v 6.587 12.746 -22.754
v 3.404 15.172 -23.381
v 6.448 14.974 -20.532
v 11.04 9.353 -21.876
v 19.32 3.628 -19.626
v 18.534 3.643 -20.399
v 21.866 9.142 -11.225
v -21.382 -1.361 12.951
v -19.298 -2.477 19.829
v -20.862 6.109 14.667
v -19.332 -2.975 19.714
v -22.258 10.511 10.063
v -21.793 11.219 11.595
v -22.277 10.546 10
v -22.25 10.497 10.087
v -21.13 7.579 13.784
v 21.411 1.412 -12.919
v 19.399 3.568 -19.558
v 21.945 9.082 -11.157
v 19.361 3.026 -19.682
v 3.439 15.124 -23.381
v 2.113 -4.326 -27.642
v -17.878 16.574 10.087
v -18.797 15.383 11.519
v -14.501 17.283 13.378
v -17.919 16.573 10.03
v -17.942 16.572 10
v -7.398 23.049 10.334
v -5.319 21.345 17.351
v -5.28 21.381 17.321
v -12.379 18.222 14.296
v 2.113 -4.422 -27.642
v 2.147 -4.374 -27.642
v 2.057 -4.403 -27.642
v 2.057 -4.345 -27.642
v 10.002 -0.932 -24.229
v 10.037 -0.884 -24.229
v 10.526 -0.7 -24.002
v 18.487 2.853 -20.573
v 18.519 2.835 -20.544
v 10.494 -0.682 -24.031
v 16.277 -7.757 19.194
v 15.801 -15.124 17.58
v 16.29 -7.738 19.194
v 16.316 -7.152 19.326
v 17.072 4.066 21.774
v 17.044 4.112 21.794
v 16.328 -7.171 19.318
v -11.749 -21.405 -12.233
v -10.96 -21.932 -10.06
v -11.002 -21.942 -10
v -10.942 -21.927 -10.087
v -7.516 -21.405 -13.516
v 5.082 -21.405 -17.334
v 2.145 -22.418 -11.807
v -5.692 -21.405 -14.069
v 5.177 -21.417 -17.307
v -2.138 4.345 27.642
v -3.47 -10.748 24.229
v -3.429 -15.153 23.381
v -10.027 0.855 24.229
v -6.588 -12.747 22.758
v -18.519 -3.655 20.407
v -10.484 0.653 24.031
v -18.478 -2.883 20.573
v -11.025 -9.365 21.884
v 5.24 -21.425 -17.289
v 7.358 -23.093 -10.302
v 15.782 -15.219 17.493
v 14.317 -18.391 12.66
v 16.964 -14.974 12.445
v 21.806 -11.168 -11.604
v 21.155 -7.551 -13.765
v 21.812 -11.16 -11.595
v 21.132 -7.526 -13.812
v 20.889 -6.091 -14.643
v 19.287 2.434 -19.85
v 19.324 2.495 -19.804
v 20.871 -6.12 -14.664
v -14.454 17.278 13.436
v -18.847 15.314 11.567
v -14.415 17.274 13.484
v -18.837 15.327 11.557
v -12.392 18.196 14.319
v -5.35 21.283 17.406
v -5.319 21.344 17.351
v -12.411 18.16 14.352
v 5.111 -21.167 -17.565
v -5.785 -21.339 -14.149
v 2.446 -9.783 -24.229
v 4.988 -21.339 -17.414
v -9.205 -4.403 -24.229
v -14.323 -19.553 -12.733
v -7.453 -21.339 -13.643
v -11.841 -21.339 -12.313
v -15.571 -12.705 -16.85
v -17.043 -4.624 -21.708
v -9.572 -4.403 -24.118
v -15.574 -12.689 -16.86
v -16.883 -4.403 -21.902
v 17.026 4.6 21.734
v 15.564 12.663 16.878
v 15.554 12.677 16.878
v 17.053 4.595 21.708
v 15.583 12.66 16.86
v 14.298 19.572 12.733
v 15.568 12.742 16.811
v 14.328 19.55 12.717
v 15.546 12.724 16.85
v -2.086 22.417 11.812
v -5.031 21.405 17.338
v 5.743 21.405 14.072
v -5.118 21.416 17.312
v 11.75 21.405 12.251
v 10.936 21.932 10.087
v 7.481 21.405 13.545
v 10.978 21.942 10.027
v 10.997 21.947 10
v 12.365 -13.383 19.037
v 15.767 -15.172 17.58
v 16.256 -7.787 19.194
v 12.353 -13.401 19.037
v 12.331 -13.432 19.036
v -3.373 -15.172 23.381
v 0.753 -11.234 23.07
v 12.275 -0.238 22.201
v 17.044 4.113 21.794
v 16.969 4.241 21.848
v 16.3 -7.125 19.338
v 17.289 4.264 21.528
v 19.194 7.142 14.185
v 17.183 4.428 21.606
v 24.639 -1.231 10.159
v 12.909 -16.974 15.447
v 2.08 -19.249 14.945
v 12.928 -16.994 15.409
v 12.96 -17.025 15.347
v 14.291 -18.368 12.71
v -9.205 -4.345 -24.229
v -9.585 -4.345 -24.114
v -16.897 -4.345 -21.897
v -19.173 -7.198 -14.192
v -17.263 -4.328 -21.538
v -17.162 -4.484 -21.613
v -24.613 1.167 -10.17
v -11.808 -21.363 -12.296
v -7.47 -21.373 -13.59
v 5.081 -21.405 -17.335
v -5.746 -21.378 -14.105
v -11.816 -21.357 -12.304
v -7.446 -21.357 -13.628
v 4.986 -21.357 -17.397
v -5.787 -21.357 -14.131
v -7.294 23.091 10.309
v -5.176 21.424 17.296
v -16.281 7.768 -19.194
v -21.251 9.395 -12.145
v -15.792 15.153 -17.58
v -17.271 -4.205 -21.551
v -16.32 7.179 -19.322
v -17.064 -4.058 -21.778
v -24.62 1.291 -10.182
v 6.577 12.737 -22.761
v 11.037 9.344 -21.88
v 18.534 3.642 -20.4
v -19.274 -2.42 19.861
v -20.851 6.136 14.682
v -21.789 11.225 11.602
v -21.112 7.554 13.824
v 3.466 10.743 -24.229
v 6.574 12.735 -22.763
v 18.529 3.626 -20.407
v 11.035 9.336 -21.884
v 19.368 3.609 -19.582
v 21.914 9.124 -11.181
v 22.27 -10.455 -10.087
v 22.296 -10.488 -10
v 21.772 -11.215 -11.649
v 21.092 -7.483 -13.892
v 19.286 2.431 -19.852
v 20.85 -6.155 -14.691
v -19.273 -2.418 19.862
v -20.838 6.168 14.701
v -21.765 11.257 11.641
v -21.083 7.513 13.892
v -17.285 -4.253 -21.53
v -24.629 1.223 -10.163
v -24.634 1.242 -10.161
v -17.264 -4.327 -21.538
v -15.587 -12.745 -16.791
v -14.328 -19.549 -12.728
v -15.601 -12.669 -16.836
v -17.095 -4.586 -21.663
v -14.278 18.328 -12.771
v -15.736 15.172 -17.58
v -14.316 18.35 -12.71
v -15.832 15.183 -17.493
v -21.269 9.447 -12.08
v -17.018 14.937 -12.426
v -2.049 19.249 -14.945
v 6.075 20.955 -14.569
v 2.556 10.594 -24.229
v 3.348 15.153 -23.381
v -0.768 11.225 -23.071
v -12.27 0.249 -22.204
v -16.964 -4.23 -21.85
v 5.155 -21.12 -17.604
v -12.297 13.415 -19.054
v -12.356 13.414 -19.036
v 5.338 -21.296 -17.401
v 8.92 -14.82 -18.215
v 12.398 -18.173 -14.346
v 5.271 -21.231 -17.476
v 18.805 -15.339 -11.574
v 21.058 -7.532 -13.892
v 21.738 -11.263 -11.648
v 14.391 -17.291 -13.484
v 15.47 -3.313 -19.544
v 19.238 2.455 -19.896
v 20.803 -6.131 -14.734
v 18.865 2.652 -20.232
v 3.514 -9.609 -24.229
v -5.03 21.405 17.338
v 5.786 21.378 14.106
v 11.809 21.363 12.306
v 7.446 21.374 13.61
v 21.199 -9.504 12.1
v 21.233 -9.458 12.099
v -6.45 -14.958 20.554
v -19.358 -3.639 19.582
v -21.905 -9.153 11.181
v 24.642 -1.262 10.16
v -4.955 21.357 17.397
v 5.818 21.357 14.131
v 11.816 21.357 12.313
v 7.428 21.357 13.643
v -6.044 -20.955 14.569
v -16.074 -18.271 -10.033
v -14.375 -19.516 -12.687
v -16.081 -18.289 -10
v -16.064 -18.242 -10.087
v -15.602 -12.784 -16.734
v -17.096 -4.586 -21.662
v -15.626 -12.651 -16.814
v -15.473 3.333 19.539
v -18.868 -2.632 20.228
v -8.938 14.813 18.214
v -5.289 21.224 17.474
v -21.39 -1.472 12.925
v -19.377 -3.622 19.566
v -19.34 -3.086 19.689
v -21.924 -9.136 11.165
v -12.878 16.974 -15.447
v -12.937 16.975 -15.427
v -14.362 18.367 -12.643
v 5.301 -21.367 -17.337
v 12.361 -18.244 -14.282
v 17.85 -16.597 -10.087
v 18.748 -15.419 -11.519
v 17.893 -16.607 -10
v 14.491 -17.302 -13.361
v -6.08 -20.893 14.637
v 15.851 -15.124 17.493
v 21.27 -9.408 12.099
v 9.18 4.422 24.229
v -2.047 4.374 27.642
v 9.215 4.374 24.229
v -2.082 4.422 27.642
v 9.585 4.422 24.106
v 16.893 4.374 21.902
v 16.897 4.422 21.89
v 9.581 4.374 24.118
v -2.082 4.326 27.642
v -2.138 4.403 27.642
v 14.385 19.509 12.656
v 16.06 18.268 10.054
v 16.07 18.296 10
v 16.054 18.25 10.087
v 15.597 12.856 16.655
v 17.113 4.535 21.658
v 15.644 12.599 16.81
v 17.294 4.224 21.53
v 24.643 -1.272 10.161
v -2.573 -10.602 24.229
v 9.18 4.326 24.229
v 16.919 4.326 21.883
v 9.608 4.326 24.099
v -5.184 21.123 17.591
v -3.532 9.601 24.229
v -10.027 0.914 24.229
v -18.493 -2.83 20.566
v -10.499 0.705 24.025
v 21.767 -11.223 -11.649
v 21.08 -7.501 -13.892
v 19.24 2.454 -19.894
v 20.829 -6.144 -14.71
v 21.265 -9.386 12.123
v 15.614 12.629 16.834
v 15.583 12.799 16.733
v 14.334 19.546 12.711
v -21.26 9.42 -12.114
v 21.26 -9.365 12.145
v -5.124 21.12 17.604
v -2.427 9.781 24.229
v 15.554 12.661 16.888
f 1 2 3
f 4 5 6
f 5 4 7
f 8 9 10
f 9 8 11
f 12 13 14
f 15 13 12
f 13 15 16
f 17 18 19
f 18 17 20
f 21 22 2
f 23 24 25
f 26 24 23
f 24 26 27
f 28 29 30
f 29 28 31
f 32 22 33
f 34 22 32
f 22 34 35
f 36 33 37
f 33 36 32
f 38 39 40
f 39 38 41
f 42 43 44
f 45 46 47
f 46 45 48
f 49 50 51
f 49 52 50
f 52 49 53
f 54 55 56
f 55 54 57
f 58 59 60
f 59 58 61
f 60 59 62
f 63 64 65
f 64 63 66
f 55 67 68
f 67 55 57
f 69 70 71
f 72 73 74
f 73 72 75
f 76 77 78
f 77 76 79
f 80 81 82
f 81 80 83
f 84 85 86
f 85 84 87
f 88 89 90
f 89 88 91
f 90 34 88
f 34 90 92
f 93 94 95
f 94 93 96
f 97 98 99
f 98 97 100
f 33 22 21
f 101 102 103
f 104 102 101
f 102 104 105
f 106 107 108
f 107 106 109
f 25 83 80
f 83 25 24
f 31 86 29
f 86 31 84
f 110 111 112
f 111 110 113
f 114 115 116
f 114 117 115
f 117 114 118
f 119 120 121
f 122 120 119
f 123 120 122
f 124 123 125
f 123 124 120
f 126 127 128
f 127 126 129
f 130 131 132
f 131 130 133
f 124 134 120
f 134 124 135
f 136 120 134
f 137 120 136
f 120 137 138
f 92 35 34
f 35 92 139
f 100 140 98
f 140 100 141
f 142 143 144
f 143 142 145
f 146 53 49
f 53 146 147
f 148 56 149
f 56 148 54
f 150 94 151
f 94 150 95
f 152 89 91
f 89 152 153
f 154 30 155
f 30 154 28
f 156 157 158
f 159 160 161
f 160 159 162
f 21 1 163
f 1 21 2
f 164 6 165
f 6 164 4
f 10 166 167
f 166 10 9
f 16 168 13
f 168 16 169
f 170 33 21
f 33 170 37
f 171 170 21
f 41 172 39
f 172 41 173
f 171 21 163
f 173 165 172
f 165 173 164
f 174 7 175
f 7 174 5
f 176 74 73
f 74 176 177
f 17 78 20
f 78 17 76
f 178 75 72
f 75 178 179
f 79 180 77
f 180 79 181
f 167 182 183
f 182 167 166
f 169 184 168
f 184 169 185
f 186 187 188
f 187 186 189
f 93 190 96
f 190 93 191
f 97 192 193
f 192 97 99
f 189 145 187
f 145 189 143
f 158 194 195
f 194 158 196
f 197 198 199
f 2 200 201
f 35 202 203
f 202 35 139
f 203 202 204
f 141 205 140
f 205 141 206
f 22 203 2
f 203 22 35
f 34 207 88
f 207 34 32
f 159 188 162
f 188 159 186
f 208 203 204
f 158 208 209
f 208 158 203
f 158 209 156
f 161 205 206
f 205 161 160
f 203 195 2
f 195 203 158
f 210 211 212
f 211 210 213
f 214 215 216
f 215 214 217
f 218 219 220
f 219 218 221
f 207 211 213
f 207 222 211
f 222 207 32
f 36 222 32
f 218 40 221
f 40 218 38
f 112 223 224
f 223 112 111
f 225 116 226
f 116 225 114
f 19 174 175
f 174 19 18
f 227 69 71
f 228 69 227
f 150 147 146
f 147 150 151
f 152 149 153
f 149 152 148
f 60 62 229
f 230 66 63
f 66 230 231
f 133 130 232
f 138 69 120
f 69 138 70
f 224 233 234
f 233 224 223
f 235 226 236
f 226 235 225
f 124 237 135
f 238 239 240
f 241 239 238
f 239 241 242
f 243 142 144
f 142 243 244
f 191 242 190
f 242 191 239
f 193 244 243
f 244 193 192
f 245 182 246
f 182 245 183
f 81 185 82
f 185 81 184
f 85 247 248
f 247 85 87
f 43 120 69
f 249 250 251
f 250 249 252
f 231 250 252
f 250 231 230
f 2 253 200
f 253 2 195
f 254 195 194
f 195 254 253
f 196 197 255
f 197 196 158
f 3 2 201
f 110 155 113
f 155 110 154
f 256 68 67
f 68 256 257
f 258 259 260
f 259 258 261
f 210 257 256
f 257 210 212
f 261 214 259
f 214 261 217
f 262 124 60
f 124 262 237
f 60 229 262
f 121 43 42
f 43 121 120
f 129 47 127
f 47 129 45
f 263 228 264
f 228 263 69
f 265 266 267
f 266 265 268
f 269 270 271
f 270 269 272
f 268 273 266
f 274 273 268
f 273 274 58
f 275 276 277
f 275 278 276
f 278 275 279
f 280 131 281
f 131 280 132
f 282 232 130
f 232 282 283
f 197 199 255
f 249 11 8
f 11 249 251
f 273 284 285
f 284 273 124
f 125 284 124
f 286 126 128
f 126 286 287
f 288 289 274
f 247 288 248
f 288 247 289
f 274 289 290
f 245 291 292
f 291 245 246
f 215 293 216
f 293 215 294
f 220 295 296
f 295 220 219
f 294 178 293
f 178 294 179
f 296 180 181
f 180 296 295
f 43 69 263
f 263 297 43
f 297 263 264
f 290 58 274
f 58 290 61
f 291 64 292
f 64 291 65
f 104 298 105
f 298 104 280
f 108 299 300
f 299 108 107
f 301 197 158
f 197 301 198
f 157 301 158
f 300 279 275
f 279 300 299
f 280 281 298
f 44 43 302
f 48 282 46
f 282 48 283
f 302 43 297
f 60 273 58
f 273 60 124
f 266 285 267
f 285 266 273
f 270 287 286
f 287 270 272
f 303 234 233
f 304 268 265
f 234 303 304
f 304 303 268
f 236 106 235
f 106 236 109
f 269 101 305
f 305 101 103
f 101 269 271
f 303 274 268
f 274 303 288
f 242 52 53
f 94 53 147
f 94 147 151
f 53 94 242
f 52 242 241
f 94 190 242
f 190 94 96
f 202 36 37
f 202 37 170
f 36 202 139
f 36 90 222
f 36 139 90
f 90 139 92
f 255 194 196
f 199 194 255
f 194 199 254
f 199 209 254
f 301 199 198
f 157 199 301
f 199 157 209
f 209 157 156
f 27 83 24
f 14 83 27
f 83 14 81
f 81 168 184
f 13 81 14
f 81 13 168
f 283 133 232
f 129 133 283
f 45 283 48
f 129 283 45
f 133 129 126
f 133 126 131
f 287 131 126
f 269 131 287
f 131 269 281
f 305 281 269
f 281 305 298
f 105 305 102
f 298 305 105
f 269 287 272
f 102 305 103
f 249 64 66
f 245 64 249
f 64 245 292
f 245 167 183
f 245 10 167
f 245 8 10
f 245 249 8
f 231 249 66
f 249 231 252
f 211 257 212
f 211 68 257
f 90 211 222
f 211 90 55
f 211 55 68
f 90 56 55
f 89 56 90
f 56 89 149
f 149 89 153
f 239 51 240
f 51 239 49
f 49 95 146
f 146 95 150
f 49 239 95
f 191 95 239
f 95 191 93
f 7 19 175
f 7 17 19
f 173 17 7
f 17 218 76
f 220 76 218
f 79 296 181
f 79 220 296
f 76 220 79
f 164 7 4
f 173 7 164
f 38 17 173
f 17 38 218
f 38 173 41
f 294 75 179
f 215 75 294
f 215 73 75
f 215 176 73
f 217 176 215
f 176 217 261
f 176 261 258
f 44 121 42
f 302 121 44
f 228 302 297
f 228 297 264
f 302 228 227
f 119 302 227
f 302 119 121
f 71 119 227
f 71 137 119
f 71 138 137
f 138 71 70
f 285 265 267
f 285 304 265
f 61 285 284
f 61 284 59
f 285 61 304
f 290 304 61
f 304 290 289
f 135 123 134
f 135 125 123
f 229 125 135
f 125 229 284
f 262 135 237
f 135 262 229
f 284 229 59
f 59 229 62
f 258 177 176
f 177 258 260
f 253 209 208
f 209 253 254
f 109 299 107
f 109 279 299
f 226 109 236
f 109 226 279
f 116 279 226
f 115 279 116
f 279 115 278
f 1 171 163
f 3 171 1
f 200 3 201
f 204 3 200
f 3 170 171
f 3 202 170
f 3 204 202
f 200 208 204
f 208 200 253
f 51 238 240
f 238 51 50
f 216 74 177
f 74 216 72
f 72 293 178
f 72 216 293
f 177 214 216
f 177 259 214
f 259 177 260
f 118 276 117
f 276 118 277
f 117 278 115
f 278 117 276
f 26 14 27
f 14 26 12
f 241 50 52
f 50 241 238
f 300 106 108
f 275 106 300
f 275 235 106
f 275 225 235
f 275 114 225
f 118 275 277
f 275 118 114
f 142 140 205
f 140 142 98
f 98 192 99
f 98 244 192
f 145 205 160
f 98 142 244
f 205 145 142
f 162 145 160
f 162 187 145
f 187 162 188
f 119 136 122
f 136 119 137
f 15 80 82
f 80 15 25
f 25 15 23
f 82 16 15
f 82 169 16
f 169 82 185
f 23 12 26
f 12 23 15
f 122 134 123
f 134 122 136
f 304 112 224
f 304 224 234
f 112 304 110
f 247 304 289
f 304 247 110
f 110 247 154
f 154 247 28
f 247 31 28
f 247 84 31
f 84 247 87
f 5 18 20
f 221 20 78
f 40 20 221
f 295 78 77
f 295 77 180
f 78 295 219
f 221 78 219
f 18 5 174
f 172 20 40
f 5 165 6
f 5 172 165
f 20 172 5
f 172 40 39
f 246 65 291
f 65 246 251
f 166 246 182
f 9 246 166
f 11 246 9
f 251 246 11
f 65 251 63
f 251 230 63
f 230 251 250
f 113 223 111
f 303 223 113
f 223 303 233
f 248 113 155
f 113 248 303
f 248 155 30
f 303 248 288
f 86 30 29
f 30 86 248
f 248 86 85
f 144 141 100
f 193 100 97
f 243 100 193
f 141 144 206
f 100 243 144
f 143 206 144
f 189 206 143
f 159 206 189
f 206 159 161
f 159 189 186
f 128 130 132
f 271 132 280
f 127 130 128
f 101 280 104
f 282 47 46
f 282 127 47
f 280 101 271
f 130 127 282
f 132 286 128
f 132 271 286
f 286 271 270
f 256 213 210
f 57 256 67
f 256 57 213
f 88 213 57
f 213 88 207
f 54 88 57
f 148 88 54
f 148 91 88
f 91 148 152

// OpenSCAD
// Auto-generated OpenSCAD file

    inner_points = 10*[[2.2217101157563603, 1.3756566745712389, -0.9999999999995236], [2.2217101157559833, 1.375656674571155, 1.0000000000004765], [2.5437224518559574, -0.5982501255081571, -0.9999999999995455], [-2.543722451855794, 0.5982501255081497, -1.0000000000004545], [-2.2217101157561974, -1.375656674571246, -1.0000000000004765], [-2.5437224518561714, 0.5982501255080659, 0.9999999999995455], [2.54372245185558, -0.598250125508241, 1.0000000000004545], [-2.2217101157565744, -1.37565667457133, 0.9999999999995236], [0.598250125508235, 2.543722451855872, -0.9999999999997807], [0.5982501255078579, 2.543722451855788, 1.0000000000002194], [1.375656674571324, -2.2217101157562826, -0.9999999999998337], [-1.375656674571161, 2.221710115756275, -1.0000000000001663], [-0.598250125508072, -2.5437224518558796, -1.0000000000002194], [-1.375656674571538, 2.221710115756191, 0.9999999999998337], [1.3756566745709469, -2.2217101157563666, 1.0000000000001663], [-0.598250125508449, -2.5437224518559636, 0.9999999999997807], [0.8259472319902479, 1.1479595680895518, -2.414213562372891], [0.8259472319893375, 1.1479595680893495, 2.4142135623732988], [1.1479595680898442, -0.8259472319898443, -2.4142135623729133], [-1.1479595680891481, 0.8259472319899552, -2.4142135623732766], [-0.8259472319895516, -1.1479595680894406, -2.4142135623732988], [-1.1479595680900583, 0.8259472319897531, 2.4142135623729133], [1.147959568088934, -0.8259472319900465, 2.4142135623732766], [-0.8259472319904619, -1.1479595680896428, 2.414213562372891]];

    outer_points = 10*[[1.5751221079297557, -1.5123974717602358, 1.7493059644528626], [-0.3388944083376483, -1.5123974717602358, 2.329427309910509], [1.083882180487285, -2.576257788029276, 0.12853930599944596], [0.8301343357801191, 2.576257788029276, -0.7086606514570928], [0.3388944083376483, 1.5123974717602358, -2.329427309910509], [-1.083882180487285, 2.576257788029276, -0.12853930599944596], [-0.8301343357801191, -2.576257788029276, 0.7086606514570928], [-1.5751221079297557, 1.5123974717602358, -1.7493059644528626], [1.7042793252523443, 0.4374047717671705, 2.1754393054964583], [-0.20973719101505972, 0.4374047717671705, 2.755560650954105], [0.5183212300415563, -2.1309812322400767, -1.7374375427839013], [1.3956952862258478, 2.1309812322400767, 1.1573161973262547], [0.20973719101505972, -0.4374047717671705, -2.755560650954105], [-0.5183212300415563, 2.1309812322400767, 1.7374375427839013], [-1.3956952862258478, -2.1309812322400767, -1.1573161973262547], [-1.7042793252523443, -0.4374047717671705, -2.1754393054964583], [2.710334299323919, -0.31485807210193295, 0.6191764732988208], [-1.9105103328549513, -0.31485807210193295, 2.0197132933247994], [2.219094371881448, -1.3787183883709733, -1.0015901851545956], [2.401750260297422, 1.3787183883709733, -0.3989466348713828], [1.9105103328549513, 0.31485807210193295, -2.0197132933247994], [-2.219094371881448, 1.3787183883709733, 1.0015901851545956], [-2.401750260297422, -1.3787183883709733, 0.3989466348713828], [-2.710334299323919, 0.31485807210193295, -0.6191764732988208]];

    // Convex hull for inner set (I)
    module inner_hull() {
        hull() {
            for (p = inner_points) {
                translate(p) sphere(r=0.1);
            }
        }
    }

    // Convex hull for outer set (O) minus inner hull (O \ I)
    module outer_minus_inner() {
        difference() {
            hull() {
                for (p = outer_points) {
                    translate(p) sphere(r=0.1);
                }
            }
            inner_hull(); // Subtract inner hull
        }
    }

    // Convex hull for outer set (O) minus all translated inner hulls
    module outer_minus_AllTranslationInner() {
        difference() {
            hull() {
                for (p = outer_points) {
                    translate(p) sphere(r=0.1);
                }
            }
            hull() {
                translate([0,0,5]) inner_hull();
                translate([0,0,-5]) inner_hull();
            }; // Subtract translated inner hulls
        }
    }

    // Difference between outer_minus_inner and outer_minus_AllTranslationInner
    module outer_minus_inner_diff() {
        difference() {
            // Outer minus inner
            difference() {
                hull() {
                    for (p = outer_points) {
                        translate(p) sphere(r=0.1);
                    }
                }
                inner_hull();
            }

            // Subtract Outer minus AllTranslationInner
            difference() {
                hull() {
                    for (p = outer_points) {
                        translate(p) sphere(r=0.1);
                    }
                }
                hull() {
                    translate([0,0,5]) inner_hull();
                    translate([0,0,-5]) inner_hull();
                };
            }
        }
    }

    // Rendering all with colors applied
    // color([1, 0, 0, 0.5]) inner_hull(); // Transparent red
    // color([0, 1, 0, 1]) outer_minus_AllTranslationInner(); // Opaque green
    color([1, 1, 0, 1]) outer_minus_inner_diff(); // Opaque yellow
    
